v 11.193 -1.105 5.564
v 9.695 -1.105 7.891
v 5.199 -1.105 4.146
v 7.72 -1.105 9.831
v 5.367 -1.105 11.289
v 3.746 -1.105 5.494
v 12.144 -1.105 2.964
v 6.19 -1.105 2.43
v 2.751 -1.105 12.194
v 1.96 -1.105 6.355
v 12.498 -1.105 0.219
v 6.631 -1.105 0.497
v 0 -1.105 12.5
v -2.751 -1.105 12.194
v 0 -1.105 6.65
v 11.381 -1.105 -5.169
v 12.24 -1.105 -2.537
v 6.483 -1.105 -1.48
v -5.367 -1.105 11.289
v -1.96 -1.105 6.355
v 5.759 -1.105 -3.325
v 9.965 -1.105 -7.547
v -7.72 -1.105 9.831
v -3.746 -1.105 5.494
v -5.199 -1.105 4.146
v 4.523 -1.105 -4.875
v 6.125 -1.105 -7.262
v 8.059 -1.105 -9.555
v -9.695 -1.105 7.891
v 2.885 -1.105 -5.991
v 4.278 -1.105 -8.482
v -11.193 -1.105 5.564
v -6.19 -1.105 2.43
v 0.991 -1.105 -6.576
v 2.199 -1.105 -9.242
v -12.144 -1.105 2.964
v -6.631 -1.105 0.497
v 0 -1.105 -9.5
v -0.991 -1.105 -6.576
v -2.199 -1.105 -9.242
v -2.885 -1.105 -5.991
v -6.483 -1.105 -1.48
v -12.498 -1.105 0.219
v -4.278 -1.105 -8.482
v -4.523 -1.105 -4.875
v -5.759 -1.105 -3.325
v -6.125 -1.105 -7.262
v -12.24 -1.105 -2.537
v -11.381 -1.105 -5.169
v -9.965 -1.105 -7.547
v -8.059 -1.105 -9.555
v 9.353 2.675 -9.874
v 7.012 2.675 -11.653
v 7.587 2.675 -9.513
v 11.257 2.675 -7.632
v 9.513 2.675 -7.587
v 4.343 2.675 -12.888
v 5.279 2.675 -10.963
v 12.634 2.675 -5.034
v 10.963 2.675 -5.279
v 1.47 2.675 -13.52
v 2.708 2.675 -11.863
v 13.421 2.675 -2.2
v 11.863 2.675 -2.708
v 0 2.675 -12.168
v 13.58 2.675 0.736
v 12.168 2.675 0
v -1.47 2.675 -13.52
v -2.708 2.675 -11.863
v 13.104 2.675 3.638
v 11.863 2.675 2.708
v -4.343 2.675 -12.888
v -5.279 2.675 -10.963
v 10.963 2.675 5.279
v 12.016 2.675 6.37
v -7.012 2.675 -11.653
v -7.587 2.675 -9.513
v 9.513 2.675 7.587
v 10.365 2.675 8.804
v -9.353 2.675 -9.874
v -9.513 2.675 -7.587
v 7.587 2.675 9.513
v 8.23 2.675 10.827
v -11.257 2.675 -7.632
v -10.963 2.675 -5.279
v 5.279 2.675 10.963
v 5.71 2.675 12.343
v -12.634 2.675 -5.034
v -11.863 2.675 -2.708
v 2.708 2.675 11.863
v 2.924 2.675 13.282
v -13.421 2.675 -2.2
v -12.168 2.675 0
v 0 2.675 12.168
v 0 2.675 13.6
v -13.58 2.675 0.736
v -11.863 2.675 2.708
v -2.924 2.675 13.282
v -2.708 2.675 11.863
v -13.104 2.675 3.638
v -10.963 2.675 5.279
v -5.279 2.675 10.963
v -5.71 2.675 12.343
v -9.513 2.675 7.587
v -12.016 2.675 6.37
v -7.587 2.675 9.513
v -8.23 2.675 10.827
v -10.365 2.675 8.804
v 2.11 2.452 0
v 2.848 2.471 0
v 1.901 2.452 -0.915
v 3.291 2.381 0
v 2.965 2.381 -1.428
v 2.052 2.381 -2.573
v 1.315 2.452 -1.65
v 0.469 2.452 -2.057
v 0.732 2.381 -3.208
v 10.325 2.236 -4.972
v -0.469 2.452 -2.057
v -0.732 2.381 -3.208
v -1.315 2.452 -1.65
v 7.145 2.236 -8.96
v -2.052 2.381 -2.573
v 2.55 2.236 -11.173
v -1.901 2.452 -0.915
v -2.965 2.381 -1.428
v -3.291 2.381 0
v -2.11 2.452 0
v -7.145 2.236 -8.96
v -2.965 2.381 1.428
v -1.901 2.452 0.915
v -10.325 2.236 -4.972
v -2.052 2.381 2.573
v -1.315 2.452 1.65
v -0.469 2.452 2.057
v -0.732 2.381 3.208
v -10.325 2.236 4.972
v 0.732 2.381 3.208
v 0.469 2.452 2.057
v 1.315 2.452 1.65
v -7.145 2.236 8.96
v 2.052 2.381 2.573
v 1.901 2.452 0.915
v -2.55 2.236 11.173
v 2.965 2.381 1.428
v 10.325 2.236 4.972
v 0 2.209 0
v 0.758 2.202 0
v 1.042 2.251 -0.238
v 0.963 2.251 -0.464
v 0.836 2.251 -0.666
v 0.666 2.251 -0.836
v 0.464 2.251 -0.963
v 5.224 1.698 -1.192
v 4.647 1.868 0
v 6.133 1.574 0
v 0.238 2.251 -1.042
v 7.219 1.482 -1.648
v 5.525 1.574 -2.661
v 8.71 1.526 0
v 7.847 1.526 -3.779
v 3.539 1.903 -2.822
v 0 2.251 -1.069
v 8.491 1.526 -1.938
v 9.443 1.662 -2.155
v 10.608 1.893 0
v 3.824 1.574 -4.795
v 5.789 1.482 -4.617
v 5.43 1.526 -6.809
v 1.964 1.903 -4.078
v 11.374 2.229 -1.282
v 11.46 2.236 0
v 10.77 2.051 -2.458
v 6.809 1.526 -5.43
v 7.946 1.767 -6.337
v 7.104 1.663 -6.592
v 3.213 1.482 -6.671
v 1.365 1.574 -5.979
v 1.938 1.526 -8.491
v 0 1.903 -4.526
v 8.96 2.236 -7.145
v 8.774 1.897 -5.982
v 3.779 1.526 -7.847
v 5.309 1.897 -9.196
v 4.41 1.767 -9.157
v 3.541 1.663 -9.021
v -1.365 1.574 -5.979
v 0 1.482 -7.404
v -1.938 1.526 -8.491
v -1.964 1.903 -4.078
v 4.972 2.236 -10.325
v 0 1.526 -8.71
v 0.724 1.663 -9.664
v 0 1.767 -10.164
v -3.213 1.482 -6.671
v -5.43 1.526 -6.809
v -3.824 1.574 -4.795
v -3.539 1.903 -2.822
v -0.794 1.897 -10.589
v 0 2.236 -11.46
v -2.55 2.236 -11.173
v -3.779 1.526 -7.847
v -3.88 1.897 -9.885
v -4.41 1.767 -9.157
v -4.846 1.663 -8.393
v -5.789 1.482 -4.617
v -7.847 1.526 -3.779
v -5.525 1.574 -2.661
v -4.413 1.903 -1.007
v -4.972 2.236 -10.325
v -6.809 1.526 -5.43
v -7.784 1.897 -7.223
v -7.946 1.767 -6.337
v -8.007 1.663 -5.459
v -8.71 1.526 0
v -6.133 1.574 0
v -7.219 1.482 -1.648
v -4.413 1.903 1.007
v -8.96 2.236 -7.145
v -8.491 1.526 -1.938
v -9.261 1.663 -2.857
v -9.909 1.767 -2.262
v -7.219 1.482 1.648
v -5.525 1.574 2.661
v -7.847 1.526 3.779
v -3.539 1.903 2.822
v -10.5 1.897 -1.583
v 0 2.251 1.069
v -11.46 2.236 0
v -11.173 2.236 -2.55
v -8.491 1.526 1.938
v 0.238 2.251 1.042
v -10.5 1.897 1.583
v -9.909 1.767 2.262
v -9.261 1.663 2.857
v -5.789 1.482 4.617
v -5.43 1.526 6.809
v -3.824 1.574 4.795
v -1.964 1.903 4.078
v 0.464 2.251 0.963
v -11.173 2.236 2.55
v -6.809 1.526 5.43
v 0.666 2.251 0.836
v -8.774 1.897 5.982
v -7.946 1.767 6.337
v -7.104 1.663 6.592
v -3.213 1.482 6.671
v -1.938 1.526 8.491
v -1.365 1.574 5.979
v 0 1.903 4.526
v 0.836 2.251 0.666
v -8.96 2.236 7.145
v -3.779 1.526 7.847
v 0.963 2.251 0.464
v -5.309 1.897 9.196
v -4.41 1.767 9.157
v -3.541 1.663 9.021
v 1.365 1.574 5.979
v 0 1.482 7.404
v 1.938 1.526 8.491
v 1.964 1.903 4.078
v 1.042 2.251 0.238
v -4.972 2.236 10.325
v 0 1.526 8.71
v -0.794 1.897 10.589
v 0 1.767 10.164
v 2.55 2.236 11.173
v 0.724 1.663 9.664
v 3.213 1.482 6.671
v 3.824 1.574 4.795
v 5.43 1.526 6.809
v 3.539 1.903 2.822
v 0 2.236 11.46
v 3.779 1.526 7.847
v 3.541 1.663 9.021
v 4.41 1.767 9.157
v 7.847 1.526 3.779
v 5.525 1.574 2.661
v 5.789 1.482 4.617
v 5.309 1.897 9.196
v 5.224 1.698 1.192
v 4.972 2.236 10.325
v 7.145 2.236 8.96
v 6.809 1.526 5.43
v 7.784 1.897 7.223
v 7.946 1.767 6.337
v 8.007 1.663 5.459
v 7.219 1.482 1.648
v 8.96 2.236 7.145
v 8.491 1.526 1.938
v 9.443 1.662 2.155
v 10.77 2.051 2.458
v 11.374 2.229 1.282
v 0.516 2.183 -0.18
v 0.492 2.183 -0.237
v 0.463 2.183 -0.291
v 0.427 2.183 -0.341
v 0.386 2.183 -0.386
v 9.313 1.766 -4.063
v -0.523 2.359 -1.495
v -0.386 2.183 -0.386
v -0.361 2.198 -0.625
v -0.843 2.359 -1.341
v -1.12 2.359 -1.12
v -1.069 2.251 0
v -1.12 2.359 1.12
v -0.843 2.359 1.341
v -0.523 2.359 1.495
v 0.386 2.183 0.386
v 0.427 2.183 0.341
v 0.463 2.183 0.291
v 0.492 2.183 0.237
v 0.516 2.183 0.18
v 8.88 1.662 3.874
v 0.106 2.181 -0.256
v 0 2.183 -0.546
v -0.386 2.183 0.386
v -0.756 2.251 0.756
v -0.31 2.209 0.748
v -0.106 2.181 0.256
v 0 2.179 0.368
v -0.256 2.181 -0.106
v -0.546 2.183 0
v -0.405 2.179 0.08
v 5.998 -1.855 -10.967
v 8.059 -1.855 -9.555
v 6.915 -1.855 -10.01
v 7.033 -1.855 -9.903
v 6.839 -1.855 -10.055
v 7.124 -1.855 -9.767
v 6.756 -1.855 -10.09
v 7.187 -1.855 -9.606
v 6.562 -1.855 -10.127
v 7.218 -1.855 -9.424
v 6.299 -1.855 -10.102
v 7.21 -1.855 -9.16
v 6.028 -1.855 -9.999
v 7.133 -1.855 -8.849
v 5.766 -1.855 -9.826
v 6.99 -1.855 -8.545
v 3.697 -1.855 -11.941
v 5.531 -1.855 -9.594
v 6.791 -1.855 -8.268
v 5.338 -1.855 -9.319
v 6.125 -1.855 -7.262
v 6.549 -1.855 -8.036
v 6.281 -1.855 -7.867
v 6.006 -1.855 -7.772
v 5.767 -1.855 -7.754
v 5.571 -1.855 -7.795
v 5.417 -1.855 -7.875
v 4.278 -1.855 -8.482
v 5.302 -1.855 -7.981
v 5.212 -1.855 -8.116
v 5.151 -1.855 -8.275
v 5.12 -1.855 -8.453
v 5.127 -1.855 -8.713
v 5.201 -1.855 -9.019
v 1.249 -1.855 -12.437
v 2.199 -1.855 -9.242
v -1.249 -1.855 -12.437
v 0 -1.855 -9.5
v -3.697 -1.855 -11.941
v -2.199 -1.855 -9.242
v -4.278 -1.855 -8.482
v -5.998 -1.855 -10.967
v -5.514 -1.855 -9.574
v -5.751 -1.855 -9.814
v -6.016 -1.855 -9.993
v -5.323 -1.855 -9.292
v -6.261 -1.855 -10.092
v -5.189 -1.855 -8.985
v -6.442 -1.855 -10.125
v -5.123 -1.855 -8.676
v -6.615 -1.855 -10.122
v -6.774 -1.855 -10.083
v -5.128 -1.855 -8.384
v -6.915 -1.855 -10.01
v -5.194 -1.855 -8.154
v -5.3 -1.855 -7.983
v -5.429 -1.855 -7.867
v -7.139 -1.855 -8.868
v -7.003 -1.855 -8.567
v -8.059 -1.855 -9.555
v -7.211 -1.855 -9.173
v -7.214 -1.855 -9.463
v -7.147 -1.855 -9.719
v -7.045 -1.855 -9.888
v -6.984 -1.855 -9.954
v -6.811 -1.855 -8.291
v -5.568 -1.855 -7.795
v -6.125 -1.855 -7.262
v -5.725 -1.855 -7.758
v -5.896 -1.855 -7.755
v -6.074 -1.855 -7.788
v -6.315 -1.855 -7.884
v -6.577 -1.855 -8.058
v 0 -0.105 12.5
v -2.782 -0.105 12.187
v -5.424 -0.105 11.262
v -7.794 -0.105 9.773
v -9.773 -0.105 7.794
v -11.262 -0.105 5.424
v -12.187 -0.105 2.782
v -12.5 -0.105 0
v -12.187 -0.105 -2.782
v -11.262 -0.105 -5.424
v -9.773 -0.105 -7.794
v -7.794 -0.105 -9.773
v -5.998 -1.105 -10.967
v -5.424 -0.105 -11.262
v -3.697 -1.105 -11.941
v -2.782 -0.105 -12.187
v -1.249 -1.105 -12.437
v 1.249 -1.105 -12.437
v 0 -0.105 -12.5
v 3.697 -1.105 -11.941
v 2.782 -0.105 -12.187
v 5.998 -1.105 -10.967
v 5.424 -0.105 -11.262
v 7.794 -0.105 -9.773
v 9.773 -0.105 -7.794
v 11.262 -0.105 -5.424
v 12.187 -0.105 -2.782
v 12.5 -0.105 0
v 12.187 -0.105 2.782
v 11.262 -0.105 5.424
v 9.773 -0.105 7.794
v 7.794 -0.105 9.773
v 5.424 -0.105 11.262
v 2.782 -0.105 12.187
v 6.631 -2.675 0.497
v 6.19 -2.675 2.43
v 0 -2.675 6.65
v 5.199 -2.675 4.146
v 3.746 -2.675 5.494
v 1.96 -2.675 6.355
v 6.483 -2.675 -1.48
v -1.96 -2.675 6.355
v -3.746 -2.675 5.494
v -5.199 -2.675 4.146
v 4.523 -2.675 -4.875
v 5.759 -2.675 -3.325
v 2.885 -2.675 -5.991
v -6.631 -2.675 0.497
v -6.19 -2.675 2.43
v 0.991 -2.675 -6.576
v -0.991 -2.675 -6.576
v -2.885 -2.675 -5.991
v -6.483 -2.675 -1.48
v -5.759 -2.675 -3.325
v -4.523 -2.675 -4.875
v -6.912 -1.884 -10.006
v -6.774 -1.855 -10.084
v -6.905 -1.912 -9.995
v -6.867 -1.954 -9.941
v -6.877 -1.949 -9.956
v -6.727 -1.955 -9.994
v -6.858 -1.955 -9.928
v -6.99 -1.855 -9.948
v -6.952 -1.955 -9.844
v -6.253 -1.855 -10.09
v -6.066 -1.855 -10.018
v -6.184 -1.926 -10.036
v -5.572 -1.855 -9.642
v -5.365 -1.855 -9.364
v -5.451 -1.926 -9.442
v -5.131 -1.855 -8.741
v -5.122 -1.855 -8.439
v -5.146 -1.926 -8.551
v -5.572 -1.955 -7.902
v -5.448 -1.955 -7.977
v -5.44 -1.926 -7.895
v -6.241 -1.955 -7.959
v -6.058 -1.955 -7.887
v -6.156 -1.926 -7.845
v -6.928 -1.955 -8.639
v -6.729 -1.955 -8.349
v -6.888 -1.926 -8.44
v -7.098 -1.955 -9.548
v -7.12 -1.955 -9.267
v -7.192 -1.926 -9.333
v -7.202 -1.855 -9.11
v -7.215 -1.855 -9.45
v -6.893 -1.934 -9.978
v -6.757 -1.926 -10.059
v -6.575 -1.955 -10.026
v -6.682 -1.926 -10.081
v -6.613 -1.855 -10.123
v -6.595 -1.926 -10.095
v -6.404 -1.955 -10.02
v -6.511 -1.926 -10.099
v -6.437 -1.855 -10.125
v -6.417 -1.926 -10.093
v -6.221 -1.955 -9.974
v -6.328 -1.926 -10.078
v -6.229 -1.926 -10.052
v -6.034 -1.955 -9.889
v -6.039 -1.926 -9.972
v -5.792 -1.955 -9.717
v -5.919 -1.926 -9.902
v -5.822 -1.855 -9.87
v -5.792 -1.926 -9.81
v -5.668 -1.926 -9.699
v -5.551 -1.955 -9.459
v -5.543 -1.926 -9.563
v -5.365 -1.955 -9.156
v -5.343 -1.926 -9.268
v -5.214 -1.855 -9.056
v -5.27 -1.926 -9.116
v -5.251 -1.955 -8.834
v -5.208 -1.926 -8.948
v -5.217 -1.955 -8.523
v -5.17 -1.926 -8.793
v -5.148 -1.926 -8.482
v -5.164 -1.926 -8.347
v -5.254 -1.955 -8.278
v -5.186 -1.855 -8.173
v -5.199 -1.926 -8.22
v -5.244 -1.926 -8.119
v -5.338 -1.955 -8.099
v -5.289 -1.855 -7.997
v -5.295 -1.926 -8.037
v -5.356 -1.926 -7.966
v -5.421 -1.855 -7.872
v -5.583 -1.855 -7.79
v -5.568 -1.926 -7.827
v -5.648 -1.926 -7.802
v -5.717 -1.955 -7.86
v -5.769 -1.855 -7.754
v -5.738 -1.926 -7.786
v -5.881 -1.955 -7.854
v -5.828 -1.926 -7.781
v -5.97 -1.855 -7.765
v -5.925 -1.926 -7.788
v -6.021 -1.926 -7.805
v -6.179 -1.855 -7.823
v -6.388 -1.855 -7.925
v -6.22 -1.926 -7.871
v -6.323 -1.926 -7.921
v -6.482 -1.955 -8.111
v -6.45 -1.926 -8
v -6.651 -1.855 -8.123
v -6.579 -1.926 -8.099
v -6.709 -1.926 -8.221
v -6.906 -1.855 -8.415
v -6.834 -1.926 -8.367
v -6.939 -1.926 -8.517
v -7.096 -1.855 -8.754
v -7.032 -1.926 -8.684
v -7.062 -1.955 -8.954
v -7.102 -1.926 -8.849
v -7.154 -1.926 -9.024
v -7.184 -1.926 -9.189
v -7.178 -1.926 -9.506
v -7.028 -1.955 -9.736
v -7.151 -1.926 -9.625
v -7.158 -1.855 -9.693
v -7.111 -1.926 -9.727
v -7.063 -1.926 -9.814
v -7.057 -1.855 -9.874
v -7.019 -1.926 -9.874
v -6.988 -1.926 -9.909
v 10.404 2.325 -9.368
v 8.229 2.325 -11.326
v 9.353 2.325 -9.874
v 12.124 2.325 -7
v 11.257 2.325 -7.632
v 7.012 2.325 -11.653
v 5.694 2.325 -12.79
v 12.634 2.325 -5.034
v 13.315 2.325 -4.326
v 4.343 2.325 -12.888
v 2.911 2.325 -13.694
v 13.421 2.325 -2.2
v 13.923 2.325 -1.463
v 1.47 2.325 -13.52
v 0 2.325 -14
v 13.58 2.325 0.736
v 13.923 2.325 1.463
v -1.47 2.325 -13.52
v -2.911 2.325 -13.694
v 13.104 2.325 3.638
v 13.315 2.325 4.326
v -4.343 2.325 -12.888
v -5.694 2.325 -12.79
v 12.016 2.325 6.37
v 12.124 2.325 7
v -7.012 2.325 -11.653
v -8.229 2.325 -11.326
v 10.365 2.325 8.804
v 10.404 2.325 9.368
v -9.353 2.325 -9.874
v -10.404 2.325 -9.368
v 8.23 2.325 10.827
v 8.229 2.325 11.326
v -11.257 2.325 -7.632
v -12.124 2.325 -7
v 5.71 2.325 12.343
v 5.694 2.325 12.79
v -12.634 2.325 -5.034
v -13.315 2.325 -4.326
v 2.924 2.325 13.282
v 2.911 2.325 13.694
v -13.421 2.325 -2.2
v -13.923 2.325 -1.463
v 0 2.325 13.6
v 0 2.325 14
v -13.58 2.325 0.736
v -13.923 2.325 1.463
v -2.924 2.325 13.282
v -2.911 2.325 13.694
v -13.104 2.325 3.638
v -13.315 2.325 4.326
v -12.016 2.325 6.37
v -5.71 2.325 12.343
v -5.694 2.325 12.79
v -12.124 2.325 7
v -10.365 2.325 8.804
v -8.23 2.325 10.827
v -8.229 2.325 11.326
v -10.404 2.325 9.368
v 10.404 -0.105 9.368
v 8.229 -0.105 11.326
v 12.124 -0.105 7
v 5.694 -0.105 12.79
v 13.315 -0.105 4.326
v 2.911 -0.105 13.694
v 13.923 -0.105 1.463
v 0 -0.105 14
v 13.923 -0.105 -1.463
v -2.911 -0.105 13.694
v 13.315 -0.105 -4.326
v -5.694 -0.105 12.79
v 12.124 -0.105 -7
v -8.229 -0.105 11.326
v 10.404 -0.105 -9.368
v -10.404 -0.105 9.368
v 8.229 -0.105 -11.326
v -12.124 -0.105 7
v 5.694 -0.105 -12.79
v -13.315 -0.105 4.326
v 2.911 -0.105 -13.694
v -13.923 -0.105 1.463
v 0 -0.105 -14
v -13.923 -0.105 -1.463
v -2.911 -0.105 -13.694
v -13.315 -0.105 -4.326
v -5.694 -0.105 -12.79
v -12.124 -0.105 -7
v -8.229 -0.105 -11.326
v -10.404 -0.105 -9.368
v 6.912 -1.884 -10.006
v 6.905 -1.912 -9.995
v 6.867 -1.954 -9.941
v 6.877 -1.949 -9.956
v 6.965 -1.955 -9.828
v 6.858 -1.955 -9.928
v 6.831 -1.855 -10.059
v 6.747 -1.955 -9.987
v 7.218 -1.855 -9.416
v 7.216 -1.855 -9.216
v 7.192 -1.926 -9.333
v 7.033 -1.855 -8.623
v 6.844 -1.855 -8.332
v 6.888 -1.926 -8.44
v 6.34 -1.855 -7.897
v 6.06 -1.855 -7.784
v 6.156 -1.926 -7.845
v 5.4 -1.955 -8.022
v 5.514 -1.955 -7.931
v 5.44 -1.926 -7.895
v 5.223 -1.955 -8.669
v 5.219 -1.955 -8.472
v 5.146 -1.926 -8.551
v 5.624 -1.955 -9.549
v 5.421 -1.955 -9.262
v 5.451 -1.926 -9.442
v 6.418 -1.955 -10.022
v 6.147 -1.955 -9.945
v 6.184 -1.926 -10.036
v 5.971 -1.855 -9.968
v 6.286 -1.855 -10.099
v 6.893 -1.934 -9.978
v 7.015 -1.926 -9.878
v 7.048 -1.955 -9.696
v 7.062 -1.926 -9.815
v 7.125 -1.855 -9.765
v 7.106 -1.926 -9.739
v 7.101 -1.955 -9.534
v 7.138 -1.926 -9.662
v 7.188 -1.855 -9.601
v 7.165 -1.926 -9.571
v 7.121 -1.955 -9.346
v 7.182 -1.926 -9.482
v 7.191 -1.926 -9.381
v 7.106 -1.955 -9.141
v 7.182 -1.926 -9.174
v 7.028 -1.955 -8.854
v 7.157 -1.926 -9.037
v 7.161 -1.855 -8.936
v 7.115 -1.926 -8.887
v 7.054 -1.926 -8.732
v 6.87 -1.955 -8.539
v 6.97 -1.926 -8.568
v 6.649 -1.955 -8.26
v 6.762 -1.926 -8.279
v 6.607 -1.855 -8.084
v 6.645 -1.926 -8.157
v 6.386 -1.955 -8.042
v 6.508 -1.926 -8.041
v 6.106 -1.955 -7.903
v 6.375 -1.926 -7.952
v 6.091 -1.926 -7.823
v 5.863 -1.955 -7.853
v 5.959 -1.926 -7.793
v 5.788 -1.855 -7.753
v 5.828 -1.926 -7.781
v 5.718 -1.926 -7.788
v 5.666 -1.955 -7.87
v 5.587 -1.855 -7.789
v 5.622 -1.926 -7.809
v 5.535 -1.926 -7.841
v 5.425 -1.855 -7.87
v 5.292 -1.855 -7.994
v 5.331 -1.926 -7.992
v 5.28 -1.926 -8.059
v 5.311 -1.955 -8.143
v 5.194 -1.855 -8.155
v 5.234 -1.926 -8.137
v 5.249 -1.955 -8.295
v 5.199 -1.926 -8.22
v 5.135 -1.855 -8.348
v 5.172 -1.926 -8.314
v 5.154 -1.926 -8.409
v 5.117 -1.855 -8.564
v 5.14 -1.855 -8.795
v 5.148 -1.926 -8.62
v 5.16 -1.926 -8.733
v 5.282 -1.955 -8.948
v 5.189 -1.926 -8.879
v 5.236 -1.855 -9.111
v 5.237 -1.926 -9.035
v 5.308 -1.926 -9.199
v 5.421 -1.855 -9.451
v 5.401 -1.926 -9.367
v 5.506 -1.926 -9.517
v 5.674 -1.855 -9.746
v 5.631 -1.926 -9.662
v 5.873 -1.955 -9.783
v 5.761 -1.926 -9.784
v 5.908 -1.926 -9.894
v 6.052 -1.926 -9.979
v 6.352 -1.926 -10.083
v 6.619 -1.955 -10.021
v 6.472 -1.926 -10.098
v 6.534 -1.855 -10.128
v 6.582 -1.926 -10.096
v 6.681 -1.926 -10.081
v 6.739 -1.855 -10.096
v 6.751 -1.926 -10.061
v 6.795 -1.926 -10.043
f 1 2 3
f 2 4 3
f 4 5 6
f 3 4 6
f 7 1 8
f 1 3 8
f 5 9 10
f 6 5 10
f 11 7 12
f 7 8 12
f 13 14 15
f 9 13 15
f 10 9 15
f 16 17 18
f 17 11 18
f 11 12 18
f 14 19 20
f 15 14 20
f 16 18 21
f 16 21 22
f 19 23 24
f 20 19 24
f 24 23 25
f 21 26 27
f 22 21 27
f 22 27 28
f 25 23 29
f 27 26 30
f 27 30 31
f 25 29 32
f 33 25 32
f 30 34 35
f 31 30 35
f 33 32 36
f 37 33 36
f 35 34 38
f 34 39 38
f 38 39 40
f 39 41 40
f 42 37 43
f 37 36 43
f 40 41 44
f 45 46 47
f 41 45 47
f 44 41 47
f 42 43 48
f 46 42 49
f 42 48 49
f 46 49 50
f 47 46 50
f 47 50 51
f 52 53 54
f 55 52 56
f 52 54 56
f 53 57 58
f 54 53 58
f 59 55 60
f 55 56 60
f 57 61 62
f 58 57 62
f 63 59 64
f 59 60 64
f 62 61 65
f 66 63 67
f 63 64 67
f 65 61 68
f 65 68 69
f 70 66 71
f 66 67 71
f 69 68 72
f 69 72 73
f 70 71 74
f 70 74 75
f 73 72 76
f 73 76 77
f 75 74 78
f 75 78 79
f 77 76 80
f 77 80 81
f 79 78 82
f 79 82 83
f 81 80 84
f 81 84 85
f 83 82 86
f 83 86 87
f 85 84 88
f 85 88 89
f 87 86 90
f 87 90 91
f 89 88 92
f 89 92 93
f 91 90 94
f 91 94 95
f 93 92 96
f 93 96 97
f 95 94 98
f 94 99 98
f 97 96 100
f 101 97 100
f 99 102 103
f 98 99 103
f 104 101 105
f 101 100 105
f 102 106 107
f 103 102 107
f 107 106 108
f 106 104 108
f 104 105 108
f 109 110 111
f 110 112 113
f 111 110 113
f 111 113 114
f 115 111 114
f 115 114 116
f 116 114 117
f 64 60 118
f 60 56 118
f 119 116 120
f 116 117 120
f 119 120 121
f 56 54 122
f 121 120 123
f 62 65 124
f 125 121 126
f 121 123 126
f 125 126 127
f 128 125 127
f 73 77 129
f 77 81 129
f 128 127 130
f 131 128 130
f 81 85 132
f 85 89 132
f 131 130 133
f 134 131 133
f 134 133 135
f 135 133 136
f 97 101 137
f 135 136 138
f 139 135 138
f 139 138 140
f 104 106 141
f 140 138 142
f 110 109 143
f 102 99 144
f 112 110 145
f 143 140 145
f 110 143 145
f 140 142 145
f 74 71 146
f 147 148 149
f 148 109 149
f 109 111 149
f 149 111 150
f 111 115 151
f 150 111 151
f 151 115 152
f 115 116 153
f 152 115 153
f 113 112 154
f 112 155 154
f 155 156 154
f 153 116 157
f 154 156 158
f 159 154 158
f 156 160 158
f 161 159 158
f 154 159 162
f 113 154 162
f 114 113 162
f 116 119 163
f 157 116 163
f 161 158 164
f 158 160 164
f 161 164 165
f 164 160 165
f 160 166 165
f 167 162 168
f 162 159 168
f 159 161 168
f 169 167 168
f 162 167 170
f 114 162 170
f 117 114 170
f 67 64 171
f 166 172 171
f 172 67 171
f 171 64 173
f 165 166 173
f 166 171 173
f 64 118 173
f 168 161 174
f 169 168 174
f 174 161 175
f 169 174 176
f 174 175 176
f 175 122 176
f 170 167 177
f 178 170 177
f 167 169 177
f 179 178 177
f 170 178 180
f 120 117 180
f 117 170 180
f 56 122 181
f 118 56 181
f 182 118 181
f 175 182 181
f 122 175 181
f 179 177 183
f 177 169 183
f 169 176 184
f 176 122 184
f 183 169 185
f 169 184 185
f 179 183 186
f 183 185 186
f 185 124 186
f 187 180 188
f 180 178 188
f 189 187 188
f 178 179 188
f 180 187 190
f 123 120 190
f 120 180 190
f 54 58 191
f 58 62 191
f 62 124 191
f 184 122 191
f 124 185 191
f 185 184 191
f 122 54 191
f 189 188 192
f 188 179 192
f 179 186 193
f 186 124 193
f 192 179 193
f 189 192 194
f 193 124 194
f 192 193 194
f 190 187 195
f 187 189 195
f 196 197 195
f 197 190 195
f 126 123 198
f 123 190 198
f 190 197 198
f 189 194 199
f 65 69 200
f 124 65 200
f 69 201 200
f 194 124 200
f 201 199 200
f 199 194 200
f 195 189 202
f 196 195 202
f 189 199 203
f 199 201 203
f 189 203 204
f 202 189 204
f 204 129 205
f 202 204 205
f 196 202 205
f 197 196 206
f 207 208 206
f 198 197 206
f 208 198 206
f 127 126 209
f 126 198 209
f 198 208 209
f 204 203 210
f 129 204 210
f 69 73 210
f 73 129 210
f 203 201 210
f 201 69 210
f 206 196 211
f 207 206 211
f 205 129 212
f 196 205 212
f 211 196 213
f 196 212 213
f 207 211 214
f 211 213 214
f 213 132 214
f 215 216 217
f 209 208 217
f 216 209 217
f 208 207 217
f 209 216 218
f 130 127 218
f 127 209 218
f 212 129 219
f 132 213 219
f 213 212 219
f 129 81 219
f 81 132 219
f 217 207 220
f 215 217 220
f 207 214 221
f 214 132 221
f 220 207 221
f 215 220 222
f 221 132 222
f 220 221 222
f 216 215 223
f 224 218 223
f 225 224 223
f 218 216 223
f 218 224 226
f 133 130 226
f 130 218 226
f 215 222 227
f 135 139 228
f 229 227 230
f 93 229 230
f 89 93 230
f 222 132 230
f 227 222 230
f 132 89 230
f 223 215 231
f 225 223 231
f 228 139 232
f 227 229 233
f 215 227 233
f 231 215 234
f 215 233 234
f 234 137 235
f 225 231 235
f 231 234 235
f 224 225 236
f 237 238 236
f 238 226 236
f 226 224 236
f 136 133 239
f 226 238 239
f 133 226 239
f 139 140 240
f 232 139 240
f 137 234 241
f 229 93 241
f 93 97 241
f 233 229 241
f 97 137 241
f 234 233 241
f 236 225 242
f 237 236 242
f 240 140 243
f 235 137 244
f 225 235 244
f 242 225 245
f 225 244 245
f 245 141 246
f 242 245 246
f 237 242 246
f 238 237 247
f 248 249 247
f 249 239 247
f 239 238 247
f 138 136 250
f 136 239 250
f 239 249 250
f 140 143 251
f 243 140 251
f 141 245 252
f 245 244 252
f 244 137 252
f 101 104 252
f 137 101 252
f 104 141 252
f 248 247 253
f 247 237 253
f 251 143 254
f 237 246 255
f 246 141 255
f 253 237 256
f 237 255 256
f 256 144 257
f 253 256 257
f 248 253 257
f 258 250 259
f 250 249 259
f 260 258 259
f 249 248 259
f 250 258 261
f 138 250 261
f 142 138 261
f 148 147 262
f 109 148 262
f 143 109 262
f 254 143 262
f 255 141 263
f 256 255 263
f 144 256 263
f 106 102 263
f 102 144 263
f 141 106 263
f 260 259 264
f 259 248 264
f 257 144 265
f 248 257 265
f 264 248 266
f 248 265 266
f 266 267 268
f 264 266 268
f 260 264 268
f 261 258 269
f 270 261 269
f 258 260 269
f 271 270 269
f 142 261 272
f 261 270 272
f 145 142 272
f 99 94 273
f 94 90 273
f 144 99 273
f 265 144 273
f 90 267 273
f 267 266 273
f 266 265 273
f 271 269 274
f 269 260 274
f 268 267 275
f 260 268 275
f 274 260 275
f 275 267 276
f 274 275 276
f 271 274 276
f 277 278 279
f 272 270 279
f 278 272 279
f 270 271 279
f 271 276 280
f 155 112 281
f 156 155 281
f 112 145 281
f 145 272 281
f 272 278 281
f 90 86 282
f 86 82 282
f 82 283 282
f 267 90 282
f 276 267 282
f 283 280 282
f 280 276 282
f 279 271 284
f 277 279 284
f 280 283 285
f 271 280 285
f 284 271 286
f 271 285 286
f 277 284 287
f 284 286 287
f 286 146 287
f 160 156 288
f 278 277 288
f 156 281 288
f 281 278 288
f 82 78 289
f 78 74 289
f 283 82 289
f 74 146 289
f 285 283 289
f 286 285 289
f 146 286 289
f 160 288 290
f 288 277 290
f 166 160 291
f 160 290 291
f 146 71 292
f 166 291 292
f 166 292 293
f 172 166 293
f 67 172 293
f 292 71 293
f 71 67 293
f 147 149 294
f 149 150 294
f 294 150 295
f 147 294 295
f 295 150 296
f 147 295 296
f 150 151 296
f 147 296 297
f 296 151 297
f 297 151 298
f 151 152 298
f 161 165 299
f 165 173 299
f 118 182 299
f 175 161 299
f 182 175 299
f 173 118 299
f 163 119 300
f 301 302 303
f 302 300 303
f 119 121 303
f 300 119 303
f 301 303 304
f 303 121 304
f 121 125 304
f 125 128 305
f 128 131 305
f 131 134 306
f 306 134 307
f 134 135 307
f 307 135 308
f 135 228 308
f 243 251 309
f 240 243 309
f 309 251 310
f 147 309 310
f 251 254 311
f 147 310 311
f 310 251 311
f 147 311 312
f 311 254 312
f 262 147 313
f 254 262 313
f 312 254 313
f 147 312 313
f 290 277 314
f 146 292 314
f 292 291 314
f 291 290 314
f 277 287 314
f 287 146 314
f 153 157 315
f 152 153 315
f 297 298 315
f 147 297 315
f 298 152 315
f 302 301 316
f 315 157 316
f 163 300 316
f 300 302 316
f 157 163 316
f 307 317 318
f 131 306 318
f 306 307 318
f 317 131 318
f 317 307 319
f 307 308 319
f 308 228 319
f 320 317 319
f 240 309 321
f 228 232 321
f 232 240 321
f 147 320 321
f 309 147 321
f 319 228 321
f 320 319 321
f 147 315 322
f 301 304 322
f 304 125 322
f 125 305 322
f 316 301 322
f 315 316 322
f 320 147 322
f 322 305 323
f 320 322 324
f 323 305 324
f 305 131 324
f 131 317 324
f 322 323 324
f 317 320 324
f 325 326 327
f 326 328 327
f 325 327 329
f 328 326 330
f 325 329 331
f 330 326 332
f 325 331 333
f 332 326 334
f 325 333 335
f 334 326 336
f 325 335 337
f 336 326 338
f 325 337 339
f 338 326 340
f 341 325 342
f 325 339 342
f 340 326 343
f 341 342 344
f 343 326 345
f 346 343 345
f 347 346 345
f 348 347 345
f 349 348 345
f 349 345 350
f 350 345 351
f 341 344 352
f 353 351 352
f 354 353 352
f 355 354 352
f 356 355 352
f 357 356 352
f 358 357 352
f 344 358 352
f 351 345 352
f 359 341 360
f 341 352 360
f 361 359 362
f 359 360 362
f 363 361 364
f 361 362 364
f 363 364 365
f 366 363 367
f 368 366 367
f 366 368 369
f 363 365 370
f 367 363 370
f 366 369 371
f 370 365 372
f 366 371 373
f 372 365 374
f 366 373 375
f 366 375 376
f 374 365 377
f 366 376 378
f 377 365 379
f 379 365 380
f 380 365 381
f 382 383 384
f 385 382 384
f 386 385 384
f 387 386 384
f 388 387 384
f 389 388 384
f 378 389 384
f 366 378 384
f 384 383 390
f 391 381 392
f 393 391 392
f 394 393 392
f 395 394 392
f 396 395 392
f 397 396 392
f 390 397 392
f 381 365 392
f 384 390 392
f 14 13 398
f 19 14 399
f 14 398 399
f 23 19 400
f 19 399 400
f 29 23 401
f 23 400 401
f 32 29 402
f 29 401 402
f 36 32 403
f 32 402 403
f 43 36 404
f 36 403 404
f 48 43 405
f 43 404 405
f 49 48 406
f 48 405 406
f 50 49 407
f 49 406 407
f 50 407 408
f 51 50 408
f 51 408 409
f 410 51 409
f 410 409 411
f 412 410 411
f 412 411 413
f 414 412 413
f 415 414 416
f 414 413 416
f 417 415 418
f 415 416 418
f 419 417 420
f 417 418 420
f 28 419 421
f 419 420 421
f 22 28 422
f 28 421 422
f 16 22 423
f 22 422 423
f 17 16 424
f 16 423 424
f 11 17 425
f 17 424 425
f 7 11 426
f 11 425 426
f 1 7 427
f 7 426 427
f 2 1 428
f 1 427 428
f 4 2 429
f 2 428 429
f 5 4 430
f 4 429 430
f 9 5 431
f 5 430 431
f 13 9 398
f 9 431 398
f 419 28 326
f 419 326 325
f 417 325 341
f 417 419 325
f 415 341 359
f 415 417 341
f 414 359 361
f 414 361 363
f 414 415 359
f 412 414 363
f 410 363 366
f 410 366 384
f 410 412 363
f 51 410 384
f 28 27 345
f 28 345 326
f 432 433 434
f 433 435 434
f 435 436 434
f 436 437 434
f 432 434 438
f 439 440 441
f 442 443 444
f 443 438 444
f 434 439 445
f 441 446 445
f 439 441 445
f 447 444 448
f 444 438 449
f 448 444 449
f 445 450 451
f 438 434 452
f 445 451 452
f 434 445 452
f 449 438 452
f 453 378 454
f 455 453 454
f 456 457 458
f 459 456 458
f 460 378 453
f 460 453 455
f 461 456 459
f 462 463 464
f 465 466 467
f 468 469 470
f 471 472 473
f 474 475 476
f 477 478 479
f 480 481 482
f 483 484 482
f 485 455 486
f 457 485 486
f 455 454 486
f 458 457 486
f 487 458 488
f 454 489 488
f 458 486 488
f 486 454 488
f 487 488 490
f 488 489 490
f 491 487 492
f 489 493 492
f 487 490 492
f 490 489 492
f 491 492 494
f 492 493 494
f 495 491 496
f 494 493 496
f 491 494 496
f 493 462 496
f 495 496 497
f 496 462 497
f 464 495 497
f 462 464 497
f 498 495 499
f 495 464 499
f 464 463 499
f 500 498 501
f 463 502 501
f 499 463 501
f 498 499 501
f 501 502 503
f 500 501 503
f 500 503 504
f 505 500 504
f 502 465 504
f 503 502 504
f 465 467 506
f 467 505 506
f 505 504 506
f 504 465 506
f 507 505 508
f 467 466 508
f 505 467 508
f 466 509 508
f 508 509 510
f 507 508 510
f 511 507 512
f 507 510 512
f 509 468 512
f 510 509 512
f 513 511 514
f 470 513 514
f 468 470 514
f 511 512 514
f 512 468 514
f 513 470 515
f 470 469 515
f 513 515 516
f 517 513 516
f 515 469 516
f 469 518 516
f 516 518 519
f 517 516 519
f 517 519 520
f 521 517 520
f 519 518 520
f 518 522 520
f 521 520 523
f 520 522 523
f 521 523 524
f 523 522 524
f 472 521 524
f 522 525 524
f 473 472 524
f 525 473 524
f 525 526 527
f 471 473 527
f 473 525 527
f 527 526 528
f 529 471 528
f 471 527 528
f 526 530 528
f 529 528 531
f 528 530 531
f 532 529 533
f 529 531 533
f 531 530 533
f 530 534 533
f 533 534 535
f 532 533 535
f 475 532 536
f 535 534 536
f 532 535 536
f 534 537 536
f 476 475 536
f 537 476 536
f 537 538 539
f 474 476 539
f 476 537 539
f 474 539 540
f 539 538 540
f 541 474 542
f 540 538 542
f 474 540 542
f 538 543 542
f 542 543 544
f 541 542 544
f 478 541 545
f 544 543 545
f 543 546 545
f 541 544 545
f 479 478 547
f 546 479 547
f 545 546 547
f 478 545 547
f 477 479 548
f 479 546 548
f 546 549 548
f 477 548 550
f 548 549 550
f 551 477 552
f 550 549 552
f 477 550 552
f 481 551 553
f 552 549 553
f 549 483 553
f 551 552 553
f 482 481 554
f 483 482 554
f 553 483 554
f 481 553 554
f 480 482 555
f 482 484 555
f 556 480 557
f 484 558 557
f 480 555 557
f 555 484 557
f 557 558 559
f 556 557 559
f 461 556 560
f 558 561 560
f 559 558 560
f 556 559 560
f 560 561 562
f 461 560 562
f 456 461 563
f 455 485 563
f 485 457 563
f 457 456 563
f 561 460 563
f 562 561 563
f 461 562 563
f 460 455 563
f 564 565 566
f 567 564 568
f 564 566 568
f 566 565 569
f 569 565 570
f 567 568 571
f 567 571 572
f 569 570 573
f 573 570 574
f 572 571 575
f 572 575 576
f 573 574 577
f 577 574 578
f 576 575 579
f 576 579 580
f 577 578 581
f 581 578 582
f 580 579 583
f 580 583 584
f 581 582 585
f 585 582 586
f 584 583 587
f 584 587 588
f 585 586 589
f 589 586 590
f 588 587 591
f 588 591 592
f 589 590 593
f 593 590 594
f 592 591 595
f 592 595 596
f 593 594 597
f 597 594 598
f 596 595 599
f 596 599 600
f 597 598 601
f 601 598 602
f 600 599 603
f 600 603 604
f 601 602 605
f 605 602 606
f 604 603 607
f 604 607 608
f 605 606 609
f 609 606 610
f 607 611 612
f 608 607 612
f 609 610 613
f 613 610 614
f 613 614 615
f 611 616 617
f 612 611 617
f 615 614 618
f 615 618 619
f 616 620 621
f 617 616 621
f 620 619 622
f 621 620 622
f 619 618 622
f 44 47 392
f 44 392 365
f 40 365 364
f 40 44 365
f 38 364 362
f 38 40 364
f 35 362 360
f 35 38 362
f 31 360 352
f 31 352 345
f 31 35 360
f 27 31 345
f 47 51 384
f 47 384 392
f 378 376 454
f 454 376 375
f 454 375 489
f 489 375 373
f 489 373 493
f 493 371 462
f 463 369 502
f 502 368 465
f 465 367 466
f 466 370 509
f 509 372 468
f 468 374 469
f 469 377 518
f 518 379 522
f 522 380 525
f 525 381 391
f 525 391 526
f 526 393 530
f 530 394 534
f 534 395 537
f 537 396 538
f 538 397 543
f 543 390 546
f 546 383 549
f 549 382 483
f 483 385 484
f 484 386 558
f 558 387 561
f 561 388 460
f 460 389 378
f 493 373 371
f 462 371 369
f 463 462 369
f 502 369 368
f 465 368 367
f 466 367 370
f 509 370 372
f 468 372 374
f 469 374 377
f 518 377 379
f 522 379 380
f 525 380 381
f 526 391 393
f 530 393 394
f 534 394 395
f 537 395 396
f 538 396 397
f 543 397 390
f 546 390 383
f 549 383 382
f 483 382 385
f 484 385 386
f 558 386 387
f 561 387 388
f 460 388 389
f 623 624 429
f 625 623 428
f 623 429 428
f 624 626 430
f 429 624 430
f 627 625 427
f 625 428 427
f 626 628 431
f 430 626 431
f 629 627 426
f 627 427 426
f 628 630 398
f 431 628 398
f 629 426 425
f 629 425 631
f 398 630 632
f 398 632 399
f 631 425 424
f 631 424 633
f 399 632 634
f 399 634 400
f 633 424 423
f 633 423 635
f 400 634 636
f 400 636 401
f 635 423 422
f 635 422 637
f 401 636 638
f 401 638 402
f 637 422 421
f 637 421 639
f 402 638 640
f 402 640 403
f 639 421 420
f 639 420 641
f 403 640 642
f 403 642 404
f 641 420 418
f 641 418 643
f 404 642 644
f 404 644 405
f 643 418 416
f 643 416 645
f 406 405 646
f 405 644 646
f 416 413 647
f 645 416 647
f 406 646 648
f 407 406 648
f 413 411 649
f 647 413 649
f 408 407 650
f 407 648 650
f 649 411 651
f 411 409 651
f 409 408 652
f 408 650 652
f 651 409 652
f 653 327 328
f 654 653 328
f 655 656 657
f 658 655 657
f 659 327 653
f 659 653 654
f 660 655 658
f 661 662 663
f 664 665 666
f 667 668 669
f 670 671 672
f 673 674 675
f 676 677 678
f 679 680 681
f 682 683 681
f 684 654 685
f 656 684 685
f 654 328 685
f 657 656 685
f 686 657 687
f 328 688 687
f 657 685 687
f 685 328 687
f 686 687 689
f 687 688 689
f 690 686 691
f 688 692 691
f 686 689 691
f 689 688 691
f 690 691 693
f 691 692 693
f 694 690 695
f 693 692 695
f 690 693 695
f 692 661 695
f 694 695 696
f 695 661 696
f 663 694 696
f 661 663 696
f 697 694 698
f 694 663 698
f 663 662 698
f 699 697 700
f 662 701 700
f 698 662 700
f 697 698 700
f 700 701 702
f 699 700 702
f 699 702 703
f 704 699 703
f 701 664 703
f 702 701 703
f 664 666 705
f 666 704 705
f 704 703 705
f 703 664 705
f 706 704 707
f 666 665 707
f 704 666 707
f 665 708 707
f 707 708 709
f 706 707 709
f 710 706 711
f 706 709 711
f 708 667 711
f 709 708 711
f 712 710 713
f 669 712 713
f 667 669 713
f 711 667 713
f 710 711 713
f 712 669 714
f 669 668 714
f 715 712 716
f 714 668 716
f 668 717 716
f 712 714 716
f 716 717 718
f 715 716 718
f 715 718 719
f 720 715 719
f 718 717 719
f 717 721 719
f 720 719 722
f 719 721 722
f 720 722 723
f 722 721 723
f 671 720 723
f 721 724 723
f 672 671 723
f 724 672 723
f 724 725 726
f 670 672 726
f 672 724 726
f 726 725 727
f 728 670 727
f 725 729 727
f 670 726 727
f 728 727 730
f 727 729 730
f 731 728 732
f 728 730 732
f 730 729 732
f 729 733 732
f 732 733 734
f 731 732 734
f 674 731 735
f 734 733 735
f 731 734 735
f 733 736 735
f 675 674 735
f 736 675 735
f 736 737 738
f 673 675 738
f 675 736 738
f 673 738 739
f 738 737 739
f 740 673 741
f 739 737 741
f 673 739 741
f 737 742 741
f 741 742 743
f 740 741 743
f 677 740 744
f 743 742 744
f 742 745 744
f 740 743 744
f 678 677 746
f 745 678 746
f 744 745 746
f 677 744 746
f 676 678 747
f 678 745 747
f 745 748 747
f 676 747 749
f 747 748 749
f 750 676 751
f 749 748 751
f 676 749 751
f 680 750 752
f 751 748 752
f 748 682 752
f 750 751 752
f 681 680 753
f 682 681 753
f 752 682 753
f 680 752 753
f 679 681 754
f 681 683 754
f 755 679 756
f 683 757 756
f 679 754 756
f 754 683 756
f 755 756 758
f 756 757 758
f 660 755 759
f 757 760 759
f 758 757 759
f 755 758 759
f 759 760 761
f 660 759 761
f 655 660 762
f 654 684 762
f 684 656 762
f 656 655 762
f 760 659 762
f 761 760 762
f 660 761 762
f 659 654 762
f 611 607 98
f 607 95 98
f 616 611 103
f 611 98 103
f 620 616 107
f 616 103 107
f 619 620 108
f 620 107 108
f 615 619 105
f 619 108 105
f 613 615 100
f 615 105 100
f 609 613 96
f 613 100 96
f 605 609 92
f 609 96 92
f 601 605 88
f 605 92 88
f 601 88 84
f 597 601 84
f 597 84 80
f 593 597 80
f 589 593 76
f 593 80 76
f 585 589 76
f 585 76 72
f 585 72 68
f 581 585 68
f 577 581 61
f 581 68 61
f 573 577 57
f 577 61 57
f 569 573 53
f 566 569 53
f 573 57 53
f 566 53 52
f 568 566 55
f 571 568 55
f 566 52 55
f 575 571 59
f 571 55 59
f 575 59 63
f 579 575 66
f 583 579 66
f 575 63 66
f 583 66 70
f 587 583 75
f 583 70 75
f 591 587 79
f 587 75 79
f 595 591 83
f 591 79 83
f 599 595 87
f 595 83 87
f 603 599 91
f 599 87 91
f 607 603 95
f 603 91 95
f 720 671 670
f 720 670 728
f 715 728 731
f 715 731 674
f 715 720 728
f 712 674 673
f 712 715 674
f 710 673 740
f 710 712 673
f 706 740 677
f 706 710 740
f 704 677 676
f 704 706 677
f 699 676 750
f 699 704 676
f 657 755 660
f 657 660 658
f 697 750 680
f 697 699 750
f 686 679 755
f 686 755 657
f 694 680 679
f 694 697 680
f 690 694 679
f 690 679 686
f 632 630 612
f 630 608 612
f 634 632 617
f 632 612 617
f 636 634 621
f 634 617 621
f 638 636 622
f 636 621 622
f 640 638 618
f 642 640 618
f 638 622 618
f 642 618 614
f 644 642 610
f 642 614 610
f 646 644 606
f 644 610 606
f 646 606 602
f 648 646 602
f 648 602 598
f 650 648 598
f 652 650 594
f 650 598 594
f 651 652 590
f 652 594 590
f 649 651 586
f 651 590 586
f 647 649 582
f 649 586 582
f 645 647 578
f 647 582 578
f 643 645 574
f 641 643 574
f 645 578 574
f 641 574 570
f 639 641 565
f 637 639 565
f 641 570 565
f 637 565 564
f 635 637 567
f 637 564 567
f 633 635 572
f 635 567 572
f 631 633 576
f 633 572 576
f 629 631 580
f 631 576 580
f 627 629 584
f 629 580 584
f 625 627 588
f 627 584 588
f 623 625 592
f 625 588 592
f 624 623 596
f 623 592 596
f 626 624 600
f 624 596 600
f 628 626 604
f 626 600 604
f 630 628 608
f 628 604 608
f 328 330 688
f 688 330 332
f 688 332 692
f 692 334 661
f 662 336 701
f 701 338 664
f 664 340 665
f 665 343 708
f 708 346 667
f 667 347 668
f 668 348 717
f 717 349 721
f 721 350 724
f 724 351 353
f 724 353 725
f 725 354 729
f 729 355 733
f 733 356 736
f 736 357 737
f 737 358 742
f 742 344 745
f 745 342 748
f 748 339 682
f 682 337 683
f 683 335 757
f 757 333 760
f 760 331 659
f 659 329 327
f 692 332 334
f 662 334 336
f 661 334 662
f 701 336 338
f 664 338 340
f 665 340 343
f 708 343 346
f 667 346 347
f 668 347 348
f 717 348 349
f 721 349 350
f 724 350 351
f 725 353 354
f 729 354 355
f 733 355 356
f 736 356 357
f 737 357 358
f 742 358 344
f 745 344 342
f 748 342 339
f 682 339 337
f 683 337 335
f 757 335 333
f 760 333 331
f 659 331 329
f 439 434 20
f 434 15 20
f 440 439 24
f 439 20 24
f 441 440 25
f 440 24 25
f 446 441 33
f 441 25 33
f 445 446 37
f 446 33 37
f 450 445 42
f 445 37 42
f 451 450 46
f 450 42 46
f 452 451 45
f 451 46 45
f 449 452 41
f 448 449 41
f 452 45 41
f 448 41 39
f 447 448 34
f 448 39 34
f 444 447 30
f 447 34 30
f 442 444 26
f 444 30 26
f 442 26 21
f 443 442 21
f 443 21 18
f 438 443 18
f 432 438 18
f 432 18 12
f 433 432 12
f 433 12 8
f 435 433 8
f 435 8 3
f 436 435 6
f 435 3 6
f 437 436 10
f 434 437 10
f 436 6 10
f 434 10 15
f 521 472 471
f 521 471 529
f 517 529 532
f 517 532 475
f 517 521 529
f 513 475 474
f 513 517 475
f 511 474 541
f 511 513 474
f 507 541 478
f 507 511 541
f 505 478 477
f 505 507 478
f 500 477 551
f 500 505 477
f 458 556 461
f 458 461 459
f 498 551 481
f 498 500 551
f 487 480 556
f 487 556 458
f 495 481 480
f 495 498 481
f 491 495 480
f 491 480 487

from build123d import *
from build123d.topology import SkipClean

# Parameters (mm, degrees)
BOSS_EXTRUDE1_DEPTH = 0.75
SKETCH4_RX          = 1.303717269
SKETCH4_RY          = 0.905346041
BOSS_EXTRUDE2_DEPTH = 0.1
FILLET1_R           = 0.1


with BuildPart() as part:
    # Sketch1 → Revolve1 (revolve)
    with BuildSketch(Plane(origin=(0, 0, 0), x_dir=(0, 0, -1), z_dir=(1, 0, 0)), mode=Mode.PRIVATE) as revolve1_sk:
        Polygon((0, 2.675), (0, -2.675), (6.65, -2.675), (6.65, -1.105), (12.5, -1.105), (12.5, -0.105), (14, -0.105), (14, 2.325), (13.6, 2.325), (13.6, 2.675), align=None)
    revolve(revolve1_sk.sketch.rotate(Axis((0, 2.675, 0), (0, -1, 0)), 180), axis=Axis((0, 2.675, 0), (0, -1, 0)))

    # Sketch2 → Cut-Revolve1 (revolve, cut)
    with BuildSketch(Plane.XY):
        with BuildLine():
            Line((12.167843198, 2.675), (12.167843198, 4.188369308))
            Line((12.167843198, 4.188369308), (0, 4.188369308))
            Line((0, 4.188369308), (0, 2.20930679))
            add(Edge.make_bspline(
                [(0, 2.20930679), (0.697493383, 2.096114571), (1.712976925, 2.479358765), (3.089812768, 2.524529264), (5.522613834, 1.273374007), (10.13555892, 1.104929536), (12.167843198, 2.675)],
                knots=[0, 0, 0, 0, 0.198883602, 0.334629802, 0.396962893, 1, 1, 1, 1], degree=3))
        make_face()
    revolve(axis=Axis((0, -2.675, 0), (0, 1, 0)), mode=Mode.SUBTRACT)

    # Sketch3 → Boss-Extrude1 (add)
    with SkipClean():  # the faces are left unmerged after this step: merging them gives an invalid solid
        with BuildSketch(Plane.XZ.offset(1.105)):
            with BuildLine():
                Line((6.125, -7.261843774), (8.059210526, -9.555057598))
                ThreePointArc((8.059210526, -9.555057598), (0, -12.5), (-8.059210526, -9.555057598))
                Line((-8.059210526, -9.555057598), (-6.125, -7.261843774))
                ThreePointArc((-6.125, -7.261843774), (0, -9.5), (6.125, -7.261843774))
            make_face()
        extrude(amount=BOSS_EXTRUDE1_DEPTH)

    # Sketch4 → Boss-Extrude2 (add)
    with SkipClean():  # the faces are left unmerged after this step: merging them gives an invalid solid
        with BuildSketch(Plane.XZ.offset(1.855)):
            with Locations(Location((6.168922757, -8.940301825), (0, 0, -55.097504384))):
                Ellipse(SKETCH4_RX, SKETCH4_RY)
            with Locations(Location((-6.168922757, -8.940301825), (0, 0, -124.902495616))):
                Ellipse(SKETCH4_RX, SKETCH4_RY)
        extrude(amount=BOSS_EXTRUDE2_DEPTH)

    # Fillet1
    fillet1_edges = [part.edges().sort_by_distance(p)[0] for p in [
        (5.42295973, -1.955, -7.871088152),
        (-5.42295973, -1.955, -7.871088152),
    ]]
    fillet(fillet1_edges, radius=FILLET1_R - 0.0001)  # a hair under: the kernel refuses the full size


solid = part.part
